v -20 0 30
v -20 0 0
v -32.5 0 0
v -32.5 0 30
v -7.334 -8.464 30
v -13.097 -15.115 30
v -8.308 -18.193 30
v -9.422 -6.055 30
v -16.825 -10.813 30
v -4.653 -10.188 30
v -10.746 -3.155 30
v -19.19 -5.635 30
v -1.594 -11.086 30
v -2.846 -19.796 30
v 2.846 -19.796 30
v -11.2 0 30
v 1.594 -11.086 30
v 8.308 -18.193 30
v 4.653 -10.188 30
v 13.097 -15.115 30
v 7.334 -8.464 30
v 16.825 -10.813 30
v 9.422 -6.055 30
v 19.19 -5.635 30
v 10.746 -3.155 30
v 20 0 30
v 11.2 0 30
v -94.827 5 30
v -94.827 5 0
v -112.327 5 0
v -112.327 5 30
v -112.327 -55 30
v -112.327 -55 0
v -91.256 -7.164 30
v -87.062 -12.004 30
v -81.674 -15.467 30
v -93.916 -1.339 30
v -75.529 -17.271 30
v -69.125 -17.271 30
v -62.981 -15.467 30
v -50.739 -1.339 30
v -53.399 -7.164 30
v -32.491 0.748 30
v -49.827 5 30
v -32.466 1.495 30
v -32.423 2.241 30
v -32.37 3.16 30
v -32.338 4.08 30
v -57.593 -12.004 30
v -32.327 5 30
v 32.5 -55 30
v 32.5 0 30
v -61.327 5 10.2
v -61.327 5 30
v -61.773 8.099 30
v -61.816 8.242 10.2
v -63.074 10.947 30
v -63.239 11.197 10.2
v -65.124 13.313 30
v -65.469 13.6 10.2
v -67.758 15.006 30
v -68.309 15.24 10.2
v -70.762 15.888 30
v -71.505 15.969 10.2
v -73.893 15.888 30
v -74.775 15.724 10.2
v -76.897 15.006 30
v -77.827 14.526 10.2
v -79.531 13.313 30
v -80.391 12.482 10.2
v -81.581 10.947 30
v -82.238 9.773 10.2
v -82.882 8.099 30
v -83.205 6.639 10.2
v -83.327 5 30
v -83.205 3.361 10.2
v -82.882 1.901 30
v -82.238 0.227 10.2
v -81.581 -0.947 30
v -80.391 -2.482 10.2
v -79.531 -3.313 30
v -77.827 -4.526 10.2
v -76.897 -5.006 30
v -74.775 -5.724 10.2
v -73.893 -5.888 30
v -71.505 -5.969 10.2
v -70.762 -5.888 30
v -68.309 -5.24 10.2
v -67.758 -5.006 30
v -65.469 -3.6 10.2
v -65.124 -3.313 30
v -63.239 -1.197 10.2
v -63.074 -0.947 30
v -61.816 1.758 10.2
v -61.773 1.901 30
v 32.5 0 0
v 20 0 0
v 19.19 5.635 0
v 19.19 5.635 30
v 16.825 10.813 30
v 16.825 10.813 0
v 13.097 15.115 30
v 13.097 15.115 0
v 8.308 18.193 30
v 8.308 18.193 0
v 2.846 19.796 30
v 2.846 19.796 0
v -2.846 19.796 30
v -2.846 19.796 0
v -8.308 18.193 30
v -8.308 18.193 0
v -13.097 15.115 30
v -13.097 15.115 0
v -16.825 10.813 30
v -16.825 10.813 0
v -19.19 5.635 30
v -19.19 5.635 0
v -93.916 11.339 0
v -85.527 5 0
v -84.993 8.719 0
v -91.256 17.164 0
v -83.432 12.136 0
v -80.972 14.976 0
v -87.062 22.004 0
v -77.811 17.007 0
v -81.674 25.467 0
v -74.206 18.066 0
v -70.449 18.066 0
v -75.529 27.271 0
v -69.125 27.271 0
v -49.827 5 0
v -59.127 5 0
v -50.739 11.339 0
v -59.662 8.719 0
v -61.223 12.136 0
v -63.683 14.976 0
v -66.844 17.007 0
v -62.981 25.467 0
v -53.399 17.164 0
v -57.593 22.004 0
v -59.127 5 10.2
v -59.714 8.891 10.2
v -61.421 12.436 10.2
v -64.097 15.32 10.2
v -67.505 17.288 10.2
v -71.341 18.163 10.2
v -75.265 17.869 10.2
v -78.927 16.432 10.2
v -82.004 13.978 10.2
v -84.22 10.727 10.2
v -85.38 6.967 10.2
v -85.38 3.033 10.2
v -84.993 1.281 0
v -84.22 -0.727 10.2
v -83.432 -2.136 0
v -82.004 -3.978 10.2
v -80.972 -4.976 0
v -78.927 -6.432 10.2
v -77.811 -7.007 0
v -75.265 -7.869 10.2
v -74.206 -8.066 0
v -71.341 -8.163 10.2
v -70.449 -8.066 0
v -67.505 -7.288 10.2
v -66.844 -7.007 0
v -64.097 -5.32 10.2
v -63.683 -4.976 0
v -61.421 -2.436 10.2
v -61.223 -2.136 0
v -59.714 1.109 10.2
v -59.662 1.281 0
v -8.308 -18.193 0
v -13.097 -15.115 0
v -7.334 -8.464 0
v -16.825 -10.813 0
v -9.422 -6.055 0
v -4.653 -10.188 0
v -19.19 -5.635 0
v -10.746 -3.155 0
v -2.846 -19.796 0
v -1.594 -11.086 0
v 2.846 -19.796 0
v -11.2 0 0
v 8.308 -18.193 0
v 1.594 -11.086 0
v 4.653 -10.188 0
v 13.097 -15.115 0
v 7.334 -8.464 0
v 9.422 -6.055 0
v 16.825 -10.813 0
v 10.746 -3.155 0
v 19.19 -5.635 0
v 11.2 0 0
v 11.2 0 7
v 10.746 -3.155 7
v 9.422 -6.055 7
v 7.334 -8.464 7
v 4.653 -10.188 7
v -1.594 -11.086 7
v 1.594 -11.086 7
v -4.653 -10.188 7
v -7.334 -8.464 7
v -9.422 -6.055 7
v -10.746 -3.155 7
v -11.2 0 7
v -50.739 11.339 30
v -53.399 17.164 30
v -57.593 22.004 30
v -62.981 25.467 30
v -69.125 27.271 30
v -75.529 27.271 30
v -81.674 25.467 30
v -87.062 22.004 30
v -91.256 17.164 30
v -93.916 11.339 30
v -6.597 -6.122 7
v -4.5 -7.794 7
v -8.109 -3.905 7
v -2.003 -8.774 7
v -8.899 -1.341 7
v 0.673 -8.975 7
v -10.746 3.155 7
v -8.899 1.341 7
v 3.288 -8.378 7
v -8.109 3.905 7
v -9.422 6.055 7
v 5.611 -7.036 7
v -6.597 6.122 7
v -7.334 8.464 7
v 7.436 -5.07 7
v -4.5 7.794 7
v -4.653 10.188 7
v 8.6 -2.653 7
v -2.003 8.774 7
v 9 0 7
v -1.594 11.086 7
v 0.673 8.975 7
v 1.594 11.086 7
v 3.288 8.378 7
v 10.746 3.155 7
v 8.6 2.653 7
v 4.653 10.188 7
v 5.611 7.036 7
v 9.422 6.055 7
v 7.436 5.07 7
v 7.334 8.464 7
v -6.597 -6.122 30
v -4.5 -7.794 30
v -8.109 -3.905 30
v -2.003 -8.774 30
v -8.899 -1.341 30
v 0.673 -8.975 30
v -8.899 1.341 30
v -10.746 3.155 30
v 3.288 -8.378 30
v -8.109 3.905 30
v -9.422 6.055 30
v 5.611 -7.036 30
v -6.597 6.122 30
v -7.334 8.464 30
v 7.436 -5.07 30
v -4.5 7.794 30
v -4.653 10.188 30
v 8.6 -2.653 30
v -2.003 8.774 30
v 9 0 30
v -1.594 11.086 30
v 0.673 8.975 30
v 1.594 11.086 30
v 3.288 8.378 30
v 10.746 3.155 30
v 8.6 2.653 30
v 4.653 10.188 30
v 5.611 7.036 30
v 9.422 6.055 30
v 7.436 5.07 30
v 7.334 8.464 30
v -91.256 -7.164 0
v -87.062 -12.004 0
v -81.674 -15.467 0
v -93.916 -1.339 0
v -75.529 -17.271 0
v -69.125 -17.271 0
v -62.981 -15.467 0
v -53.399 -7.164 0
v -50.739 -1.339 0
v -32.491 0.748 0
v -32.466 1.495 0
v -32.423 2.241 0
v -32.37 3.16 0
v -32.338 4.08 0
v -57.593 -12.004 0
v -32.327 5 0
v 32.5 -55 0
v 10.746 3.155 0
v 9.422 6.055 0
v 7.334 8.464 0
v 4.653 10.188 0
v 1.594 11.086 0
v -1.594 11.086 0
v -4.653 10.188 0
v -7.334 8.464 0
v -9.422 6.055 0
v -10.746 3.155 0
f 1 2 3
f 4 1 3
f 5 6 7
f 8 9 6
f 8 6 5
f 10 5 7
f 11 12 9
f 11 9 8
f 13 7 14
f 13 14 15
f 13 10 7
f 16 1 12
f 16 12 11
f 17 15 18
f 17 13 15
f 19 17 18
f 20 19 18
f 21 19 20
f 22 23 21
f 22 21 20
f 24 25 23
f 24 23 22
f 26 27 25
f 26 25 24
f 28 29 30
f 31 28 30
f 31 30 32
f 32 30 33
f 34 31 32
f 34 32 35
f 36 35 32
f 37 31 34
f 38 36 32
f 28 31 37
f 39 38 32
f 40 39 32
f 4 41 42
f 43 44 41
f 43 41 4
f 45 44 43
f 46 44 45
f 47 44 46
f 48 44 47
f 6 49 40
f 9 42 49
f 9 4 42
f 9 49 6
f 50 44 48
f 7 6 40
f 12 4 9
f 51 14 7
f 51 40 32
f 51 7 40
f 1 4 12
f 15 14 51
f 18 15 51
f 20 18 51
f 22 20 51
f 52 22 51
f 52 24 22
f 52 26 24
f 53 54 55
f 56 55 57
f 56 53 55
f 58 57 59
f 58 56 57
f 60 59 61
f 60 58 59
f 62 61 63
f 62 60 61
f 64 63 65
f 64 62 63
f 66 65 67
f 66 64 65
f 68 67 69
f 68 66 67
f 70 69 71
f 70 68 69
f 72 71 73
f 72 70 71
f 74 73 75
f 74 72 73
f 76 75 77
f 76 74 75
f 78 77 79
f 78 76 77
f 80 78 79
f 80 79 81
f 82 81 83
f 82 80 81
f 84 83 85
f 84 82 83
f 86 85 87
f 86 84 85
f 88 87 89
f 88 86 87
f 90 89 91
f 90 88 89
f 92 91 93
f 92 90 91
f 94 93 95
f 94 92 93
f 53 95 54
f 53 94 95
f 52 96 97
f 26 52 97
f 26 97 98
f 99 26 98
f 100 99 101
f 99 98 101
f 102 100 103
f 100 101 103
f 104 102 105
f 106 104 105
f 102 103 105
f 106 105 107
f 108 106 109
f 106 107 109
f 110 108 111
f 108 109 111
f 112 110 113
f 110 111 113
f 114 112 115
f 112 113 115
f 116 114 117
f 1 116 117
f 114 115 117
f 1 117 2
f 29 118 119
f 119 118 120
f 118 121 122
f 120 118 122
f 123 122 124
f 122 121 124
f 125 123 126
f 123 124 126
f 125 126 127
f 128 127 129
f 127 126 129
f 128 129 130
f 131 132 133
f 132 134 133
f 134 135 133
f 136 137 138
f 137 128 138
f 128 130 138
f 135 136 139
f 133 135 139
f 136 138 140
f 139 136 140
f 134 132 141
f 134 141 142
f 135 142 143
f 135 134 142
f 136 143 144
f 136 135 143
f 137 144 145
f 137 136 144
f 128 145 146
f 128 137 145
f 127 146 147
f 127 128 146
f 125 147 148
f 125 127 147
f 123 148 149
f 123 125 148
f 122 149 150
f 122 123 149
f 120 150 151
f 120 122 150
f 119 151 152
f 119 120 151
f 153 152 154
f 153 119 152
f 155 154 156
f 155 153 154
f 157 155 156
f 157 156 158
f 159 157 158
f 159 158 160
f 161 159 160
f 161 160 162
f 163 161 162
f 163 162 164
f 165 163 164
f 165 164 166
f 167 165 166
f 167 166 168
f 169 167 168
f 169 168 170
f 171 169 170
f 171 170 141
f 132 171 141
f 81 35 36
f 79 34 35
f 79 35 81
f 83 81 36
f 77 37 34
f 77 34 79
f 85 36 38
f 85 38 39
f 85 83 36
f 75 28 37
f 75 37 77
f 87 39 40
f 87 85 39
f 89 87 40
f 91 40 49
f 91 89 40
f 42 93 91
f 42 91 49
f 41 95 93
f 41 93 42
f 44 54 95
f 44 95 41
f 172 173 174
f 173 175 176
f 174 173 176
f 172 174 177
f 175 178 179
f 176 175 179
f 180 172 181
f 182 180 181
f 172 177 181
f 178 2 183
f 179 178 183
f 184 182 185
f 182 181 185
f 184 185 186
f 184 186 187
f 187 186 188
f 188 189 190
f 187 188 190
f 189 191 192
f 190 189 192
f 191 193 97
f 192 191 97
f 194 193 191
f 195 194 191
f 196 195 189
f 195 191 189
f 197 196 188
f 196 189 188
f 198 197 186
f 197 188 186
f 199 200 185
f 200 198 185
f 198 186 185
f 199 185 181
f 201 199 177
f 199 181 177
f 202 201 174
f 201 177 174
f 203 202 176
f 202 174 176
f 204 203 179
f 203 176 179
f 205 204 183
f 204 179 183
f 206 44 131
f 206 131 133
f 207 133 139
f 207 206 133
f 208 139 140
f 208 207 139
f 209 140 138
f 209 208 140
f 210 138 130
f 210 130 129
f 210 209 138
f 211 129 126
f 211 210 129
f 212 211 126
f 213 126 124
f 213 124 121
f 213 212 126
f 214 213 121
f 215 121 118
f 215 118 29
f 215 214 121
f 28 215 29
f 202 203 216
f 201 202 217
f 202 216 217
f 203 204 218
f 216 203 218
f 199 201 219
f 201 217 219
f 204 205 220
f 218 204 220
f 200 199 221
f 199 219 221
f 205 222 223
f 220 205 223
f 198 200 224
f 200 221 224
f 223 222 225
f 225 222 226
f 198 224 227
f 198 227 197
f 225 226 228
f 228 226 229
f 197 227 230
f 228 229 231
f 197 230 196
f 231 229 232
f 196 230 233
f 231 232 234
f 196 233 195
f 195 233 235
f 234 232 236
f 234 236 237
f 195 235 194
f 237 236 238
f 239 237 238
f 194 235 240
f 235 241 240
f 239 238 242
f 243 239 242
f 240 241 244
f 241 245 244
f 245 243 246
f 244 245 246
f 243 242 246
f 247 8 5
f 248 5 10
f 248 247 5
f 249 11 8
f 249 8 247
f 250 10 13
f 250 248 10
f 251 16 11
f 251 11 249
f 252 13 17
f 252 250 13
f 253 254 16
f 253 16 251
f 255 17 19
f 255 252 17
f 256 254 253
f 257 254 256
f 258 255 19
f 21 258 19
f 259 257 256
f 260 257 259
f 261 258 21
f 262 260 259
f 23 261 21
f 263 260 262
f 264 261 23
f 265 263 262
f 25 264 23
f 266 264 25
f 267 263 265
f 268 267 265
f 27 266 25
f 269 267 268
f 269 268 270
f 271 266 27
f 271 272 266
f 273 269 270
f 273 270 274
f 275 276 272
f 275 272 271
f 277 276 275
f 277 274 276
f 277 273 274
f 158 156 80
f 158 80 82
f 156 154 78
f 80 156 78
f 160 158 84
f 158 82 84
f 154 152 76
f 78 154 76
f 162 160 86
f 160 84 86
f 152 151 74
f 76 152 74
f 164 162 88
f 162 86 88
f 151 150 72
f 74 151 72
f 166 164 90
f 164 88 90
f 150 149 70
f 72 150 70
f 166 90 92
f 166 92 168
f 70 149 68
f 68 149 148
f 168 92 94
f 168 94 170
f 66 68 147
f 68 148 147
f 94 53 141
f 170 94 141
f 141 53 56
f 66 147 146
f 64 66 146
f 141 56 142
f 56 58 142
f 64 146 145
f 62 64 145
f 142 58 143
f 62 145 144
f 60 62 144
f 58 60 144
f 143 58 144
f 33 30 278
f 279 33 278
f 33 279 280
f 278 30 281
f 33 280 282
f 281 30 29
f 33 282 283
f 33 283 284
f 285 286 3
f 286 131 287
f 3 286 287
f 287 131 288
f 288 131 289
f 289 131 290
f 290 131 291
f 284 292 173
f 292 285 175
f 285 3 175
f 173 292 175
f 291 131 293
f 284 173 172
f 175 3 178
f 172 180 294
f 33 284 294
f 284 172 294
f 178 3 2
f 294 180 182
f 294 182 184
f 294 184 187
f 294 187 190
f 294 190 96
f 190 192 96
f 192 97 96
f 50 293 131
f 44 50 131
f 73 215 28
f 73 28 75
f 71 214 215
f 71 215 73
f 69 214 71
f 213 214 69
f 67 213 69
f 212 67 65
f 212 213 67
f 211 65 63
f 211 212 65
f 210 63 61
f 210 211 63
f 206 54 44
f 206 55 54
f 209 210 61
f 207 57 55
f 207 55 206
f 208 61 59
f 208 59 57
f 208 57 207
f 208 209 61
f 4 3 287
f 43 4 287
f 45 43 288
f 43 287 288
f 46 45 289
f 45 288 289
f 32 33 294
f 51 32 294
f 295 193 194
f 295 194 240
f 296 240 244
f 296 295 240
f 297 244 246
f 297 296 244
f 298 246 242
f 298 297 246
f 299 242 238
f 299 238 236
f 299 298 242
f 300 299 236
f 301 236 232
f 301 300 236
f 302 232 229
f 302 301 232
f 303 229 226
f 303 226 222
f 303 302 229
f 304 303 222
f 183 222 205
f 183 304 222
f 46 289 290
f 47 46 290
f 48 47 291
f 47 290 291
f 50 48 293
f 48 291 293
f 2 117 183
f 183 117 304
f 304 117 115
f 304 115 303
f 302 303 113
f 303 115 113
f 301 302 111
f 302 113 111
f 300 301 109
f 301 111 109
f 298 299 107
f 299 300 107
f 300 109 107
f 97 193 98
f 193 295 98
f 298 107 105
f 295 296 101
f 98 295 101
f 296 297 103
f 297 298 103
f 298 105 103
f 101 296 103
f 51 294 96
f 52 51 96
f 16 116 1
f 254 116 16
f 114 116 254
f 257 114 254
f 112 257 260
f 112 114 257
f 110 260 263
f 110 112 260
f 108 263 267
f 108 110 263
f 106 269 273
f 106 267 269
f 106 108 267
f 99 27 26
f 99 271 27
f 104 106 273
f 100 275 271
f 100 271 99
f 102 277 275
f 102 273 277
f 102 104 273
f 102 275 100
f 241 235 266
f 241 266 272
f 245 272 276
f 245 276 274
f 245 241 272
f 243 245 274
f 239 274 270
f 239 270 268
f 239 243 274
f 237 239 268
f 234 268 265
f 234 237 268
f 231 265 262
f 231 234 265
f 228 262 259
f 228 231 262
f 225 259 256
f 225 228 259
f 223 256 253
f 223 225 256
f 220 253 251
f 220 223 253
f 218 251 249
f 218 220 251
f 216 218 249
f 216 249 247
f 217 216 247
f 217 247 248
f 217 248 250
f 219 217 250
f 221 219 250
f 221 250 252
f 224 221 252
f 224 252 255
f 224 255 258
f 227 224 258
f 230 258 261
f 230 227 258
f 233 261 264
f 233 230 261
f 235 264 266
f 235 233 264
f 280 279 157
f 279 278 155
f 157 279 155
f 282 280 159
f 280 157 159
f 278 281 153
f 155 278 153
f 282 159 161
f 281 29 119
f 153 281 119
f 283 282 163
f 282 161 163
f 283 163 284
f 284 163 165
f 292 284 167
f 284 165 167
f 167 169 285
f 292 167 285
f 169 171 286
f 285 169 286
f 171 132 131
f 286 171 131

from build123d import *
from build123d.topology import SkipClean

# Parameters (mm, degrees)
BOSS_EXTRUDE2_DEPTH = 30
SKETCH3_R           = 20
SKETCH3_R_2         = 11.2
BOSS_EXTRUDE3_DEPTH = 30
BOSS_EXTRUDE5_START = 7
SKETCH3_7_R         = 11.2
SKETCH3_7_R_2       = 9
BOSS_EXTRUDE5_DEPTH = 23
BOSS_EXTRUDE6_START = 30
SKETCH4_R           = 22.5
BOSS_EXTRUDE6_DEPTH = 30
SKETCH4_3_R         = 13.2
CUT_EXTRUDE3_DEPTH  = 10.2
SKETCH4_5_R         = 11
CUT_EXTRUDE5_DEPTH  = 129.617418947


with BuildPart() as part:
    # Sketch1 → Boss-Extrude2 (new body)
    with BuildSketch(Plane.XY):
        with BuildLine():
            ThreePointArc((-32.422618907, 2.241379763), (-73.707512578, -34.97618336), (-112.327380707, 5))
            Line((-112.327380707, 5), (-112.327380707, -55))
            Line((-112.327380707, -55), (-32.5, -55))
            Line((-32.5, -55), (-32.5, 0))
            ThreePointArc((-32.5, 0), (-32.480648966, 1.121357556), (-32.422618907, 2.241379763))
        make_face()
        with BuildLine():
            Line((-32.327380707, 5), (-62.327380707, 5))
            ThreePointArc((-62.327380707, 5), (-72.327380707, -5), (-82.327380707, 5))
            Line((-82.327380707, 5), (-112.327380707, 5))
            ThreePointArc((-112.327380707, 5), (-73.707512578, -34.97618336), (-32.422618907, 2.241379763))
            ThreePointArc((-32.422618907, 2.241379763), (-32.351197348, 3.619868129), (-32.327380707, 5))
        make_face()
        with BuildLine():
            Line((32.5, -55), (32.5, 0))
            ThreePointArc((32.5, 0), (0, -32.5), (-32.5, 0))
            Line((-32.5, 0), (-32.5, -55))
            Line((-32.5, -55), (-32.327380707, -55))
            Line((-32.327380707, -55), (32.5, -55))
        make_face()
        with BuildLine():
            ThreePointArc((-32.5, 0), (0, -32.5), (32.5, 0))
            Line((32.5, 0), (11.2, 0))
            ThreePointArc((11.2, 0), (0, -11.2), (-11.2, 0))
            Line((-11.2, 0), (-32.5, 0))
        make_face()
    extrude(amount=BOSS_EXTRUDE2_DEPTH)

    # Sketch3 → Boss-Extrude3 (add)
    with SkipClean():  # the faces are left unmerged after this step: merging them gives an invalid solid
        with BuildSketch(Plane.XY):
            Circle(SKETCH3_R)
            Circle(SKETCH3_R_2, mode=Mode.SUBTRACT)
        extrude(amount=BOSS_EXTRUDE3_DEPTH)

    # Sketch3<7> → Boss-Extrude5 (add)
    with SkipClean():  # the faces are left unmerged after this step: merging them gives an invalid solid
        with BuildSketch(Plane.XY.offset(BOSS_EXTRUDE5_START)):
            Circle(SKETCH3_7_R)
            Circle(SKETCH3_7_R_2, mode=Mode.SUBTRACT)
        extrude(amount=BOSS_EXTRUDE5_DEPTH)

    # Sketch4 → Boss-Extrude6 (add)
    with SkipClean():  # the faces are left unmerged after this step: merging them gives an invalid solid
        with BuildSketch(Plane.XY.offset(BOSS_EXTRUDE6_START)):
            with Locations((-72.327380707, 5)):
                Circle(SKETCH4_R)
        extrude(amount=-BOSS_EXTRUDE6_DEPTH)

    # Sketch4<3> → Cut-Extrude3 (cut)
    with SkipClean():  # the faces are left unmerged after this step: merging them gives an invalid solid
        with BuildSketch(Plane.XY):
            with Locations((-72.327380707, 5)):
                Circle(SKETCH4_3_R)
        extrude(amount=CUT_EXTRUDE3_DEPTH, mode=Mode.SUBTRACT)

    # Sketch4<5> → Cut-Extrude5 (cut, through all)
    with SkipClean():  # the faces are left unmerged after this step: merging them gives an invalid solid
        with BuildSketch(Plane.XY):
            with Locations((-72.327380707, 5)):
                Circle(SKETCH4_5_R)
        extrude(amount=CUT_EXTRUDE5_DEPTH, mode=Mode.SUBTRACT)


solid = part.part
